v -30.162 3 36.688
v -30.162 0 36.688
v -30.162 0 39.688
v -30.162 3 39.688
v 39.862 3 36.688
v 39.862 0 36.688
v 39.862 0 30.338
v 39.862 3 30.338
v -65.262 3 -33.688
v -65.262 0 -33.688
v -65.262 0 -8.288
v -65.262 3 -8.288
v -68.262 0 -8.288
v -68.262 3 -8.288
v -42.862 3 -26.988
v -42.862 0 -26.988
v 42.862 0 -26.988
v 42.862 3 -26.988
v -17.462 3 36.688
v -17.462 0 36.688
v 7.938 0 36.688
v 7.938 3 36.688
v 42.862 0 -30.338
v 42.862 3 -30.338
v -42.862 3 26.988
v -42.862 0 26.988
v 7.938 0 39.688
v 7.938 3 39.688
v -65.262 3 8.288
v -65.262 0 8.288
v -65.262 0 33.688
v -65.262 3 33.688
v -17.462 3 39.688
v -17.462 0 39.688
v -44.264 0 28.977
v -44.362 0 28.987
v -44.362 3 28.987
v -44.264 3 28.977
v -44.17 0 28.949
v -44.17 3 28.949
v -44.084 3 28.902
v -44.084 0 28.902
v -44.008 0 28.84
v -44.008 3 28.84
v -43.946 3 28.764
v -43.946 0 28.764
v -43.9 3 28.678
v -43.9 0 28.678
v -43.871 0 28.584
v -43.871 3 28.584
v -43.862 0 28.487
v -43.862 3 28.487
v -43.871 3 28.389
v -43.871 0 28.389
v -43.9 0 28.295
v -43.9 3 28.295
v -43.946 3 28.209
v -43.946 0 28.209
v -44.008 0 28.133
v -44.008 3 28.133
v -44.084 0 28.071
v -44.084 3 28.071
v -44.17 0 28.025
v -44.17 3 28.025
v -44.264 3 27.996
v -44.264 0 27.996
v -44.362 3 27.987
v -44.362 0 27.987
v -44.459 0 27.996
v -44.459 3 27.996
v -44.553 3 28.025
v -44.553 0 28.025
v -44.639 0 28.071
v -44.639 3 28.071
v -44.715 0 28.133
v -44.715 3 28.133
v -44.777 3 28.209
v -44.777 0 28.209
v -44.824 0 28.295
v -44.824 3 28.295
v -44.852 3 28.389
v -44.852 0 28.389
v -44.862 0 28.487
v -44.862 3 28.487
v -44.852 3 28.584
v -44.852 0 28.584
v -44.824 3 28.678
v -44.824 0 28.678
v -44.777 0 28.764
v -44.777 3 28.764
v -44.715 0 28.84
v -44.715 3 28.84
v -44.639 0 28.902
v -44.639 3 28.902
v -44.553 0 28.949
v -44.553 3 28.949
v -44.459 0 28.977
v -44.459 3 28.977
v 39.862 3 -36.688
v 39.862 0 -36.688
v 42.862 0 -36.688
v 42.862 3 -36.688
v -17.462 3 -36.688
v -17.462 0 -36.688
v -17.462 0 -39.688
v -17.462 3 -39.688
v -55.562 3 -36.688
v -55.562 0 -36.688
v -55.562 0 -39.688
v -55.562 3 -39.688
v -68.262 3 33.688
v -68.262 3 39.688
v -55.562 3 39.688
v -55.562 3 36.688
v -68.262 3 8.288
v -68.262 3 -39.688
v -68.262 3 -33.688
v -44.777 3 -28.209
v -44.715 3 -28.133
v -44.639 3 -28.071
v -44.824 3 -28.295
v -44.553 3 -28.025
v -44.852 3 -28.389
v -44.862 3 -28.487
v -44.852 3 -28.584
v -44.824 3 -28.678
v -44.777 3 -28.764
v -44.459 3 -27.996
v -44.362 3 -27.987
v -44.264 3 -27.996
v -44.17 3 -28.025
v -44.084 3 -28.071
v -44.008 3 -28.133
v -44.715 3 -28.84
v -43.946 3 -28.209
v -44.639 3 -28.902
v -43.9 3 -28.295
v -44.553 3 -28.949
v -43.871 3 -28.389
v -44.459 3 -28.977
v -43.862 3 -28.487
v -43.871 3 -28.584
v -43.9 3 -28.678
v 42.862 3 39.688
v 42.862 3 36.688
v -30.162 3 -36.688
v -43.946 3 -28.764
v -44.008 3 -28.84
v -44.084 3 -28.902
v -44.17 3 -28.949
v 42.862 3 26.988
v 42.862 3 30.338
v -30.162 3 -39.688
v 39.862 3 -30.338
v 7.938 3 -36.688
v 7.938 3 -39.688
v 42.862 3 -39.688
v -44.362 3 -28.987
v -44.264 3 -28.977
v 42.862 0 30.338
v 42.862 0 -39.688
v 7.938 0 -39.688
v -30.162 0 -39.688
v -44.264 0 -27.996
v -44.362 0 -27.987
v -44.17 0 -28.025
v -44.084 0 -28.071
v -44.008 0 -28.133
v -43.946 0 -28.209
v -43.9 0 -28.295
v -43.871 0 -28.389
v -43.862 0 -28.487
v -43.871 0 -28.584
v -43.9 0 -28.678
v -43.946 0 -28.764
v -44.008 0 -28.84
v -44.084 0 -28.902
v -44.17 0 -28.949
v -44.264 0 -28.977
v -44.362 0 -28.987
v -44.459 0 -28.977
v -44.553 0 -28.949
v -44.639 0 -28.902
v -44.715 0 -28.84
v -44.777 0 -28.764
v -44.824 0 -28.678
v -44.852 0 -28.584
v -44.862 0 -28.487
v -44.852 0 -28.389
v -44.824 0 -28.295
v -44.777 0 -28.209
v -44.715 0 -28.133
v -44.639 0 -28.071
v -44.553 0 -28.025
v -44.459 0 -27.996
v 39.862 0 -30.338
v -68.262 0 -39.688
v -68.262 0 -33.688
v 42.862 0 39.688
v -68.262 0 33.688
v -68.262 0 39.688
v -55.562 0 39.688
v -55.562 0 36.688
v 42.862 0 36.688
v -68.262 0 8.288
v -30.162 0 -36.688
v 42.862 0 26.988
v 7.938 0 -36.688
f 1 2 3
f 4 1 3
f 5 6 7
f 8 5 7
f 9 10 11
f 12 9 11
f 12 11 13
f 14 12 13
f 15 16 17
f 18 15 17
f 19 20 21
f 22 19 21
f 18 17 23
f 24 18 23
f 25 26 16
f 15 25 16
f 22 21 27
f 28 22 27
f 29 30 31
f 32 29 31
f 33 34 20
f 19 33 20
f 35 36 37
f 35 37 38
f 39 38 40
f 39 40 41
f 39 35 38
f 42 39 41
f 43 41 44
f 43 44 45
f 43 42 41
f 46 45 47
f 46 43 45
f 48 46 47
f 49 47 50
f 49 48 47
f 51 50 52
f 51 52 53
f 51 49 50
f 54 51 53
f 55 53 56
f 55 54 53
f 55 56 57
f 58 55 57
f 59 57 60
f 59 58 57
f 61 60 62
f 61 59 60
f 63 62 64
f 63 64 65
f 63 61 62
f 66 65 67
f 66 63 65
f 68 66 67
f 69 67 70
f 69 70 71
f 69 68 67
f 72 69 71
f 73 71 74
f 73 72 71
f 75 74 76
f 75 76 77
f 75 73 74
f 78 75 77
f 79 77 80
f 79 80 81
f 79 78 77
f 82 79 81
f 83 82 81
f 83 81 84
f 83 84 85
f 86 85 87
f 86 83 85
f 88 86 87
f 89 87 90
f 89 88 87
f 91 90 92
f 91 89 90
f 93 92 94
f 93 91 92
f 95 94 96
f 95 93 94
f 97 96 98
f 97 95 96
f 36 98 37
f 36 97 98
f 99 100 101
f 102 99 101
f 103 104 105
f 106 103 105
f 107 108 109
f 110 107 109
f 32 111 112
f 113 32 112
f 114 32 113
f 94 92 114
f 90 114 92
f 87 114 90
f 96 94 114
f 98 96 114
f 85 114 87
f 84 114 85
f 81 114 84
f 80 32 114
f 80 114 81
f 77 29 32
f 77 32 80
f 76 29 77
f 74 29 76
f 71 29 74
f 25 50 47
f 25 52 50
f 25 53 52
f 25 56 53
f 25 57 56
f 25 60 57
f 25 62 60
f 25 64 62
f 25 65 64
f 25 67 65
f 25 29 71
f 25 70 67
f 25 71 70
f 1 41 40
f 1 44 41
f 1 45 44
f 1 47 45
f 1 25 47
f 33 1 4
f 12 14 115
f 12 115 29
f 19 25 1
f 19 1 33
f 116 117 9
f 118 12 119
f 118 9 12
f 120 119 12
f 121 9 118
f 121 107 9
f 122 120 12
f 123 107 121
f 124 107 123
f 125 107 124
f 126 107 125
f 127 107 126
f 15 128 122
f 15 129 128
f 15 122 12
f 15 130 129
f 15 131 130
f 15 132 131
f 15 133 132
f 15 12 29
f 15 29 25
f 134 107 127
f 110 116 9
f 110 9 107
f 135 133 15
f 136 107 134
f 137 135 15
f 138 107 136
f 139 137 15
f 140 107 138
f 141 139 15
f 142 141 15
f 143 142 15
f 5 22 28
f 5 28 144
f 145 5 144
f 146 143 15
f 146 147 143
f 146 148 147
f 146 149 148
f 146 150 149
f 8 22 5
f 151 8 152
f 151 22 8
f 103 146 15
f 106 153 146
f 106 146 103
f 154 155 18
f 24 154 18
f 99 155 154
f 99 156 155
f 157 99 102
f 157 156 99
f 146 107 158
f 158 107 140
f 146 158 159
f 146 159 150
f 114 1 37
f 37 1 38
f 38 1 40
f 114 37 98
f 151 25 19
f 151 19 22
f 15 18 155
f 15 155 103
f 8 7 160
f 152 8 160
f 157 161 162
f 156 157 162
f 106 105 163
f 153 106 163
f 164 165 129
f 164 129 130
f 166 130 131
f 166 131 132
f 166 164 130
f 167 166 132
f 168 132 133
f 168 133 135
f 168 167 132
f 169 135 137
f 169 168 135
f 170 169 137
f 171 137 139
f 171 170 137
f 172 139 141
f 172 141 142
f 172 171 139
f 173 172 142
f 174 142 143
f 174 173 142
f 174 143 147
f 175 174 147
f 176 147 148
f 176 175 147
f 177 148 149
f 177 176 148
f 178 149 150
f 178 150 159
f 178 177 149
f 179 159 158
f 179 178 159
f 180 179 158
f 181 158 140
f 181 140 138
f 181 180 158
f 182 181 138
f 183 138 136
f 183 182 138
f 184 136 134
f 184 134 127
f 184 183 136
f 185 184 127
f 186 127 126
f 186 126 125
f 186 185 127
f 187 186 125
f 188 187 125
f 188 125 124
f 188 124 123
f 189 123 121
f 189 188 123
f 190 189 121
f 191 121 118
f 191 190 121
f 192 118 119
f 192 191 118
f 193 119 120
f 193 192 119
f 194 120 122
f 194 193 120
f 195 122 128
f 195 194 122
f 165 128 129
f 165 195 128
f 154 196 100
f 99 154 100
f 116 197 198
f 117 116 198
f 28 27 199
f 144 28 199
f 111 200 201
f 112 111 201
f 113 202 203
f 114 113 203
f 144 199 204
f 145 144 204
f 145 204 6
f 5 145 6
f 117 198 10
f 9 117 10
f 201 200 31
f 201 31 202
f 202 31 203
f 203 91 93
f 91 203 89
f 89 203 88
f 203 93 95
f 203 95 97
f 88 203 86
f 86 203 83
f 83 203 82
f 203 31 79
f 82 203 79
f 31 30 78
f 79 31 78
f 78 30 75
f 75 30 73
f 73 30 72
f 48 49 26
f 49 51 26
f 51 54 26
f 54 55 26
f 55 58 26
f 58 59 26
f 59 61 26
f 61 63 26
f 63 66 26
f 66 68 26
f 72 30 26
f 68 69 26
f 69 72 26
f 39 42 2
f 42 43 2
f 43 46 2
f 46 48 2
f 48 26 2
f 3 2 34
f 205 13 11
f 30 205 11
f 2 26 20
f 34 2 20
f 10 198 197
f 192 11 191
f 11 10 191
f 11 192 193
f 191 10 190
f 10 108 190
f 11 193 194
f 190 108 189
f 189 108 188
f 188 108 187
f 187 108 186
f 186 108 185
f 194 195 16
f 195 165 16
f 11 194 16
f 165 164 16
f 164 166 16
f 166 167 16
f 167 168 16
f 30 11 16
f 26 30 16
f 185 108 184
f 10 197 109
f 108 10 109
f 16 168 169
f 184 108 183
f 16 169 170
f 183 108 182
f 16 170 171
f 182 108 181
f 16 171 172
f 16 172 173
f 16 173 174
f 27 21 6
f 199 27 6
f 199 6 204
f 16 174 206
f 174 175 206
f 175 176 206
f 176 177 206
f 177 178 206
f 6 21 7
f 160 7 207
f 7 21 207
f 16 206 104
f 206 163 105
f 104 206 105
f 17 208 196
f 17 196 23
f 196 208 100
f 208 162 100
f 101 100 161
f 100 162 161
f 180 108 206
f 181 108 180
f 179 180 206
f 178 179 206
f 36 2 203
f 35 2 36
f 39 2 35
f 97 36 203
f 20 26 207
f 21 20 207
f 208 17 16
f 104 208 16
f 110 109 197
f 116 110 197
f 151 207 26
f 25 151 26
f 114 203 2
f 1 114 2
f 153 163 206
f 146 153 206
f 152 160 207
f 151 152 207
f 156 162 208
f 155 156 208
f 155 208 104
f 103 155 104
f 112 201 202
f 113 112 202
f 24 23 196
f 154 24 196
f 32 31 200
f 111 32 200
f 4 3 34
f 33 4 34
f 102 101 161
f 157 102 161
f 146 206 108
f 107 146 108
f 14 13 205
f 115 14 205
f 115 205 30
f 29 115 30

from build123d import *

# Parameters (mm, degrees)
SKETCH1_R           = 0.5
BOSS_EXTRUDE1_DEPTH = 3


with BuildPart() as part:
    # Sketch1 → Boss-Extrude1 (new body)
    with BuildSketch(Plane(origin=(0, 0, 0), x_dir=(1, 0, 0), z_dir=(0, 1, 0))):
        Polygon((42.8625, 26.9875), (42.8625, 30.3375), (39.8625, 30.3375), (39.8625, 36.6875), (42.8625, 36.6875), (42.8625, 39.6875), (7.9375, 39.6875), (7.9375, 36.6875), (-17.4625, 36.6875), (-17.4625, 39.6875), (-30.1625, 39.6875), (-30.1625, 36.6875), (-55.5625, 36.6875), (-55.5625, 39.6875), (-68.2625, 39.6875), (-68.2625, 33.6875), (-65.2625, 33.6875), (-65.2625, 8.2875), (-68.2625, 8.2875), (-68.2625, -8.2875), (-65.2625, -8.2875), (-65.2625, -33.6875), (-68.2625, -33.6875), (-68.2625, -39.6875), (-55.5625, -39.6875), (-55.5625, -36.6875), (-30.1625, -36.6875), (-30.1625, -39.6875), (-17.4625, -39.6875), (-17.4625, -36.6875), (7.9375, -36.6875), (7.9375, -39.6875), (42.8625, -39.6875), (42.8625, -36.6875), (39.8625, -36.6875), (39.8625, -30.3375), (42.8625, -30.3375), (42.8625, -26.9875), (-42.8625, -26.9875), (-42.8625, 26.9875), align=None)
        with Locations(Location((-44.361566376, 28.486566376, 0), (0, 0, 270))):
            Circle(SKETCH1_R, mode=Mode.SUBTRACT)
        with Locations(Location((-44.361566376, -28.486566376, 0), (0, 0, 270))):
            Circle(SKETCH1_R, mode=Mode.SUBTRACT)
    extrude(amount=BOSS_EXTRUDE1_DEPTH)


solid = part.part
